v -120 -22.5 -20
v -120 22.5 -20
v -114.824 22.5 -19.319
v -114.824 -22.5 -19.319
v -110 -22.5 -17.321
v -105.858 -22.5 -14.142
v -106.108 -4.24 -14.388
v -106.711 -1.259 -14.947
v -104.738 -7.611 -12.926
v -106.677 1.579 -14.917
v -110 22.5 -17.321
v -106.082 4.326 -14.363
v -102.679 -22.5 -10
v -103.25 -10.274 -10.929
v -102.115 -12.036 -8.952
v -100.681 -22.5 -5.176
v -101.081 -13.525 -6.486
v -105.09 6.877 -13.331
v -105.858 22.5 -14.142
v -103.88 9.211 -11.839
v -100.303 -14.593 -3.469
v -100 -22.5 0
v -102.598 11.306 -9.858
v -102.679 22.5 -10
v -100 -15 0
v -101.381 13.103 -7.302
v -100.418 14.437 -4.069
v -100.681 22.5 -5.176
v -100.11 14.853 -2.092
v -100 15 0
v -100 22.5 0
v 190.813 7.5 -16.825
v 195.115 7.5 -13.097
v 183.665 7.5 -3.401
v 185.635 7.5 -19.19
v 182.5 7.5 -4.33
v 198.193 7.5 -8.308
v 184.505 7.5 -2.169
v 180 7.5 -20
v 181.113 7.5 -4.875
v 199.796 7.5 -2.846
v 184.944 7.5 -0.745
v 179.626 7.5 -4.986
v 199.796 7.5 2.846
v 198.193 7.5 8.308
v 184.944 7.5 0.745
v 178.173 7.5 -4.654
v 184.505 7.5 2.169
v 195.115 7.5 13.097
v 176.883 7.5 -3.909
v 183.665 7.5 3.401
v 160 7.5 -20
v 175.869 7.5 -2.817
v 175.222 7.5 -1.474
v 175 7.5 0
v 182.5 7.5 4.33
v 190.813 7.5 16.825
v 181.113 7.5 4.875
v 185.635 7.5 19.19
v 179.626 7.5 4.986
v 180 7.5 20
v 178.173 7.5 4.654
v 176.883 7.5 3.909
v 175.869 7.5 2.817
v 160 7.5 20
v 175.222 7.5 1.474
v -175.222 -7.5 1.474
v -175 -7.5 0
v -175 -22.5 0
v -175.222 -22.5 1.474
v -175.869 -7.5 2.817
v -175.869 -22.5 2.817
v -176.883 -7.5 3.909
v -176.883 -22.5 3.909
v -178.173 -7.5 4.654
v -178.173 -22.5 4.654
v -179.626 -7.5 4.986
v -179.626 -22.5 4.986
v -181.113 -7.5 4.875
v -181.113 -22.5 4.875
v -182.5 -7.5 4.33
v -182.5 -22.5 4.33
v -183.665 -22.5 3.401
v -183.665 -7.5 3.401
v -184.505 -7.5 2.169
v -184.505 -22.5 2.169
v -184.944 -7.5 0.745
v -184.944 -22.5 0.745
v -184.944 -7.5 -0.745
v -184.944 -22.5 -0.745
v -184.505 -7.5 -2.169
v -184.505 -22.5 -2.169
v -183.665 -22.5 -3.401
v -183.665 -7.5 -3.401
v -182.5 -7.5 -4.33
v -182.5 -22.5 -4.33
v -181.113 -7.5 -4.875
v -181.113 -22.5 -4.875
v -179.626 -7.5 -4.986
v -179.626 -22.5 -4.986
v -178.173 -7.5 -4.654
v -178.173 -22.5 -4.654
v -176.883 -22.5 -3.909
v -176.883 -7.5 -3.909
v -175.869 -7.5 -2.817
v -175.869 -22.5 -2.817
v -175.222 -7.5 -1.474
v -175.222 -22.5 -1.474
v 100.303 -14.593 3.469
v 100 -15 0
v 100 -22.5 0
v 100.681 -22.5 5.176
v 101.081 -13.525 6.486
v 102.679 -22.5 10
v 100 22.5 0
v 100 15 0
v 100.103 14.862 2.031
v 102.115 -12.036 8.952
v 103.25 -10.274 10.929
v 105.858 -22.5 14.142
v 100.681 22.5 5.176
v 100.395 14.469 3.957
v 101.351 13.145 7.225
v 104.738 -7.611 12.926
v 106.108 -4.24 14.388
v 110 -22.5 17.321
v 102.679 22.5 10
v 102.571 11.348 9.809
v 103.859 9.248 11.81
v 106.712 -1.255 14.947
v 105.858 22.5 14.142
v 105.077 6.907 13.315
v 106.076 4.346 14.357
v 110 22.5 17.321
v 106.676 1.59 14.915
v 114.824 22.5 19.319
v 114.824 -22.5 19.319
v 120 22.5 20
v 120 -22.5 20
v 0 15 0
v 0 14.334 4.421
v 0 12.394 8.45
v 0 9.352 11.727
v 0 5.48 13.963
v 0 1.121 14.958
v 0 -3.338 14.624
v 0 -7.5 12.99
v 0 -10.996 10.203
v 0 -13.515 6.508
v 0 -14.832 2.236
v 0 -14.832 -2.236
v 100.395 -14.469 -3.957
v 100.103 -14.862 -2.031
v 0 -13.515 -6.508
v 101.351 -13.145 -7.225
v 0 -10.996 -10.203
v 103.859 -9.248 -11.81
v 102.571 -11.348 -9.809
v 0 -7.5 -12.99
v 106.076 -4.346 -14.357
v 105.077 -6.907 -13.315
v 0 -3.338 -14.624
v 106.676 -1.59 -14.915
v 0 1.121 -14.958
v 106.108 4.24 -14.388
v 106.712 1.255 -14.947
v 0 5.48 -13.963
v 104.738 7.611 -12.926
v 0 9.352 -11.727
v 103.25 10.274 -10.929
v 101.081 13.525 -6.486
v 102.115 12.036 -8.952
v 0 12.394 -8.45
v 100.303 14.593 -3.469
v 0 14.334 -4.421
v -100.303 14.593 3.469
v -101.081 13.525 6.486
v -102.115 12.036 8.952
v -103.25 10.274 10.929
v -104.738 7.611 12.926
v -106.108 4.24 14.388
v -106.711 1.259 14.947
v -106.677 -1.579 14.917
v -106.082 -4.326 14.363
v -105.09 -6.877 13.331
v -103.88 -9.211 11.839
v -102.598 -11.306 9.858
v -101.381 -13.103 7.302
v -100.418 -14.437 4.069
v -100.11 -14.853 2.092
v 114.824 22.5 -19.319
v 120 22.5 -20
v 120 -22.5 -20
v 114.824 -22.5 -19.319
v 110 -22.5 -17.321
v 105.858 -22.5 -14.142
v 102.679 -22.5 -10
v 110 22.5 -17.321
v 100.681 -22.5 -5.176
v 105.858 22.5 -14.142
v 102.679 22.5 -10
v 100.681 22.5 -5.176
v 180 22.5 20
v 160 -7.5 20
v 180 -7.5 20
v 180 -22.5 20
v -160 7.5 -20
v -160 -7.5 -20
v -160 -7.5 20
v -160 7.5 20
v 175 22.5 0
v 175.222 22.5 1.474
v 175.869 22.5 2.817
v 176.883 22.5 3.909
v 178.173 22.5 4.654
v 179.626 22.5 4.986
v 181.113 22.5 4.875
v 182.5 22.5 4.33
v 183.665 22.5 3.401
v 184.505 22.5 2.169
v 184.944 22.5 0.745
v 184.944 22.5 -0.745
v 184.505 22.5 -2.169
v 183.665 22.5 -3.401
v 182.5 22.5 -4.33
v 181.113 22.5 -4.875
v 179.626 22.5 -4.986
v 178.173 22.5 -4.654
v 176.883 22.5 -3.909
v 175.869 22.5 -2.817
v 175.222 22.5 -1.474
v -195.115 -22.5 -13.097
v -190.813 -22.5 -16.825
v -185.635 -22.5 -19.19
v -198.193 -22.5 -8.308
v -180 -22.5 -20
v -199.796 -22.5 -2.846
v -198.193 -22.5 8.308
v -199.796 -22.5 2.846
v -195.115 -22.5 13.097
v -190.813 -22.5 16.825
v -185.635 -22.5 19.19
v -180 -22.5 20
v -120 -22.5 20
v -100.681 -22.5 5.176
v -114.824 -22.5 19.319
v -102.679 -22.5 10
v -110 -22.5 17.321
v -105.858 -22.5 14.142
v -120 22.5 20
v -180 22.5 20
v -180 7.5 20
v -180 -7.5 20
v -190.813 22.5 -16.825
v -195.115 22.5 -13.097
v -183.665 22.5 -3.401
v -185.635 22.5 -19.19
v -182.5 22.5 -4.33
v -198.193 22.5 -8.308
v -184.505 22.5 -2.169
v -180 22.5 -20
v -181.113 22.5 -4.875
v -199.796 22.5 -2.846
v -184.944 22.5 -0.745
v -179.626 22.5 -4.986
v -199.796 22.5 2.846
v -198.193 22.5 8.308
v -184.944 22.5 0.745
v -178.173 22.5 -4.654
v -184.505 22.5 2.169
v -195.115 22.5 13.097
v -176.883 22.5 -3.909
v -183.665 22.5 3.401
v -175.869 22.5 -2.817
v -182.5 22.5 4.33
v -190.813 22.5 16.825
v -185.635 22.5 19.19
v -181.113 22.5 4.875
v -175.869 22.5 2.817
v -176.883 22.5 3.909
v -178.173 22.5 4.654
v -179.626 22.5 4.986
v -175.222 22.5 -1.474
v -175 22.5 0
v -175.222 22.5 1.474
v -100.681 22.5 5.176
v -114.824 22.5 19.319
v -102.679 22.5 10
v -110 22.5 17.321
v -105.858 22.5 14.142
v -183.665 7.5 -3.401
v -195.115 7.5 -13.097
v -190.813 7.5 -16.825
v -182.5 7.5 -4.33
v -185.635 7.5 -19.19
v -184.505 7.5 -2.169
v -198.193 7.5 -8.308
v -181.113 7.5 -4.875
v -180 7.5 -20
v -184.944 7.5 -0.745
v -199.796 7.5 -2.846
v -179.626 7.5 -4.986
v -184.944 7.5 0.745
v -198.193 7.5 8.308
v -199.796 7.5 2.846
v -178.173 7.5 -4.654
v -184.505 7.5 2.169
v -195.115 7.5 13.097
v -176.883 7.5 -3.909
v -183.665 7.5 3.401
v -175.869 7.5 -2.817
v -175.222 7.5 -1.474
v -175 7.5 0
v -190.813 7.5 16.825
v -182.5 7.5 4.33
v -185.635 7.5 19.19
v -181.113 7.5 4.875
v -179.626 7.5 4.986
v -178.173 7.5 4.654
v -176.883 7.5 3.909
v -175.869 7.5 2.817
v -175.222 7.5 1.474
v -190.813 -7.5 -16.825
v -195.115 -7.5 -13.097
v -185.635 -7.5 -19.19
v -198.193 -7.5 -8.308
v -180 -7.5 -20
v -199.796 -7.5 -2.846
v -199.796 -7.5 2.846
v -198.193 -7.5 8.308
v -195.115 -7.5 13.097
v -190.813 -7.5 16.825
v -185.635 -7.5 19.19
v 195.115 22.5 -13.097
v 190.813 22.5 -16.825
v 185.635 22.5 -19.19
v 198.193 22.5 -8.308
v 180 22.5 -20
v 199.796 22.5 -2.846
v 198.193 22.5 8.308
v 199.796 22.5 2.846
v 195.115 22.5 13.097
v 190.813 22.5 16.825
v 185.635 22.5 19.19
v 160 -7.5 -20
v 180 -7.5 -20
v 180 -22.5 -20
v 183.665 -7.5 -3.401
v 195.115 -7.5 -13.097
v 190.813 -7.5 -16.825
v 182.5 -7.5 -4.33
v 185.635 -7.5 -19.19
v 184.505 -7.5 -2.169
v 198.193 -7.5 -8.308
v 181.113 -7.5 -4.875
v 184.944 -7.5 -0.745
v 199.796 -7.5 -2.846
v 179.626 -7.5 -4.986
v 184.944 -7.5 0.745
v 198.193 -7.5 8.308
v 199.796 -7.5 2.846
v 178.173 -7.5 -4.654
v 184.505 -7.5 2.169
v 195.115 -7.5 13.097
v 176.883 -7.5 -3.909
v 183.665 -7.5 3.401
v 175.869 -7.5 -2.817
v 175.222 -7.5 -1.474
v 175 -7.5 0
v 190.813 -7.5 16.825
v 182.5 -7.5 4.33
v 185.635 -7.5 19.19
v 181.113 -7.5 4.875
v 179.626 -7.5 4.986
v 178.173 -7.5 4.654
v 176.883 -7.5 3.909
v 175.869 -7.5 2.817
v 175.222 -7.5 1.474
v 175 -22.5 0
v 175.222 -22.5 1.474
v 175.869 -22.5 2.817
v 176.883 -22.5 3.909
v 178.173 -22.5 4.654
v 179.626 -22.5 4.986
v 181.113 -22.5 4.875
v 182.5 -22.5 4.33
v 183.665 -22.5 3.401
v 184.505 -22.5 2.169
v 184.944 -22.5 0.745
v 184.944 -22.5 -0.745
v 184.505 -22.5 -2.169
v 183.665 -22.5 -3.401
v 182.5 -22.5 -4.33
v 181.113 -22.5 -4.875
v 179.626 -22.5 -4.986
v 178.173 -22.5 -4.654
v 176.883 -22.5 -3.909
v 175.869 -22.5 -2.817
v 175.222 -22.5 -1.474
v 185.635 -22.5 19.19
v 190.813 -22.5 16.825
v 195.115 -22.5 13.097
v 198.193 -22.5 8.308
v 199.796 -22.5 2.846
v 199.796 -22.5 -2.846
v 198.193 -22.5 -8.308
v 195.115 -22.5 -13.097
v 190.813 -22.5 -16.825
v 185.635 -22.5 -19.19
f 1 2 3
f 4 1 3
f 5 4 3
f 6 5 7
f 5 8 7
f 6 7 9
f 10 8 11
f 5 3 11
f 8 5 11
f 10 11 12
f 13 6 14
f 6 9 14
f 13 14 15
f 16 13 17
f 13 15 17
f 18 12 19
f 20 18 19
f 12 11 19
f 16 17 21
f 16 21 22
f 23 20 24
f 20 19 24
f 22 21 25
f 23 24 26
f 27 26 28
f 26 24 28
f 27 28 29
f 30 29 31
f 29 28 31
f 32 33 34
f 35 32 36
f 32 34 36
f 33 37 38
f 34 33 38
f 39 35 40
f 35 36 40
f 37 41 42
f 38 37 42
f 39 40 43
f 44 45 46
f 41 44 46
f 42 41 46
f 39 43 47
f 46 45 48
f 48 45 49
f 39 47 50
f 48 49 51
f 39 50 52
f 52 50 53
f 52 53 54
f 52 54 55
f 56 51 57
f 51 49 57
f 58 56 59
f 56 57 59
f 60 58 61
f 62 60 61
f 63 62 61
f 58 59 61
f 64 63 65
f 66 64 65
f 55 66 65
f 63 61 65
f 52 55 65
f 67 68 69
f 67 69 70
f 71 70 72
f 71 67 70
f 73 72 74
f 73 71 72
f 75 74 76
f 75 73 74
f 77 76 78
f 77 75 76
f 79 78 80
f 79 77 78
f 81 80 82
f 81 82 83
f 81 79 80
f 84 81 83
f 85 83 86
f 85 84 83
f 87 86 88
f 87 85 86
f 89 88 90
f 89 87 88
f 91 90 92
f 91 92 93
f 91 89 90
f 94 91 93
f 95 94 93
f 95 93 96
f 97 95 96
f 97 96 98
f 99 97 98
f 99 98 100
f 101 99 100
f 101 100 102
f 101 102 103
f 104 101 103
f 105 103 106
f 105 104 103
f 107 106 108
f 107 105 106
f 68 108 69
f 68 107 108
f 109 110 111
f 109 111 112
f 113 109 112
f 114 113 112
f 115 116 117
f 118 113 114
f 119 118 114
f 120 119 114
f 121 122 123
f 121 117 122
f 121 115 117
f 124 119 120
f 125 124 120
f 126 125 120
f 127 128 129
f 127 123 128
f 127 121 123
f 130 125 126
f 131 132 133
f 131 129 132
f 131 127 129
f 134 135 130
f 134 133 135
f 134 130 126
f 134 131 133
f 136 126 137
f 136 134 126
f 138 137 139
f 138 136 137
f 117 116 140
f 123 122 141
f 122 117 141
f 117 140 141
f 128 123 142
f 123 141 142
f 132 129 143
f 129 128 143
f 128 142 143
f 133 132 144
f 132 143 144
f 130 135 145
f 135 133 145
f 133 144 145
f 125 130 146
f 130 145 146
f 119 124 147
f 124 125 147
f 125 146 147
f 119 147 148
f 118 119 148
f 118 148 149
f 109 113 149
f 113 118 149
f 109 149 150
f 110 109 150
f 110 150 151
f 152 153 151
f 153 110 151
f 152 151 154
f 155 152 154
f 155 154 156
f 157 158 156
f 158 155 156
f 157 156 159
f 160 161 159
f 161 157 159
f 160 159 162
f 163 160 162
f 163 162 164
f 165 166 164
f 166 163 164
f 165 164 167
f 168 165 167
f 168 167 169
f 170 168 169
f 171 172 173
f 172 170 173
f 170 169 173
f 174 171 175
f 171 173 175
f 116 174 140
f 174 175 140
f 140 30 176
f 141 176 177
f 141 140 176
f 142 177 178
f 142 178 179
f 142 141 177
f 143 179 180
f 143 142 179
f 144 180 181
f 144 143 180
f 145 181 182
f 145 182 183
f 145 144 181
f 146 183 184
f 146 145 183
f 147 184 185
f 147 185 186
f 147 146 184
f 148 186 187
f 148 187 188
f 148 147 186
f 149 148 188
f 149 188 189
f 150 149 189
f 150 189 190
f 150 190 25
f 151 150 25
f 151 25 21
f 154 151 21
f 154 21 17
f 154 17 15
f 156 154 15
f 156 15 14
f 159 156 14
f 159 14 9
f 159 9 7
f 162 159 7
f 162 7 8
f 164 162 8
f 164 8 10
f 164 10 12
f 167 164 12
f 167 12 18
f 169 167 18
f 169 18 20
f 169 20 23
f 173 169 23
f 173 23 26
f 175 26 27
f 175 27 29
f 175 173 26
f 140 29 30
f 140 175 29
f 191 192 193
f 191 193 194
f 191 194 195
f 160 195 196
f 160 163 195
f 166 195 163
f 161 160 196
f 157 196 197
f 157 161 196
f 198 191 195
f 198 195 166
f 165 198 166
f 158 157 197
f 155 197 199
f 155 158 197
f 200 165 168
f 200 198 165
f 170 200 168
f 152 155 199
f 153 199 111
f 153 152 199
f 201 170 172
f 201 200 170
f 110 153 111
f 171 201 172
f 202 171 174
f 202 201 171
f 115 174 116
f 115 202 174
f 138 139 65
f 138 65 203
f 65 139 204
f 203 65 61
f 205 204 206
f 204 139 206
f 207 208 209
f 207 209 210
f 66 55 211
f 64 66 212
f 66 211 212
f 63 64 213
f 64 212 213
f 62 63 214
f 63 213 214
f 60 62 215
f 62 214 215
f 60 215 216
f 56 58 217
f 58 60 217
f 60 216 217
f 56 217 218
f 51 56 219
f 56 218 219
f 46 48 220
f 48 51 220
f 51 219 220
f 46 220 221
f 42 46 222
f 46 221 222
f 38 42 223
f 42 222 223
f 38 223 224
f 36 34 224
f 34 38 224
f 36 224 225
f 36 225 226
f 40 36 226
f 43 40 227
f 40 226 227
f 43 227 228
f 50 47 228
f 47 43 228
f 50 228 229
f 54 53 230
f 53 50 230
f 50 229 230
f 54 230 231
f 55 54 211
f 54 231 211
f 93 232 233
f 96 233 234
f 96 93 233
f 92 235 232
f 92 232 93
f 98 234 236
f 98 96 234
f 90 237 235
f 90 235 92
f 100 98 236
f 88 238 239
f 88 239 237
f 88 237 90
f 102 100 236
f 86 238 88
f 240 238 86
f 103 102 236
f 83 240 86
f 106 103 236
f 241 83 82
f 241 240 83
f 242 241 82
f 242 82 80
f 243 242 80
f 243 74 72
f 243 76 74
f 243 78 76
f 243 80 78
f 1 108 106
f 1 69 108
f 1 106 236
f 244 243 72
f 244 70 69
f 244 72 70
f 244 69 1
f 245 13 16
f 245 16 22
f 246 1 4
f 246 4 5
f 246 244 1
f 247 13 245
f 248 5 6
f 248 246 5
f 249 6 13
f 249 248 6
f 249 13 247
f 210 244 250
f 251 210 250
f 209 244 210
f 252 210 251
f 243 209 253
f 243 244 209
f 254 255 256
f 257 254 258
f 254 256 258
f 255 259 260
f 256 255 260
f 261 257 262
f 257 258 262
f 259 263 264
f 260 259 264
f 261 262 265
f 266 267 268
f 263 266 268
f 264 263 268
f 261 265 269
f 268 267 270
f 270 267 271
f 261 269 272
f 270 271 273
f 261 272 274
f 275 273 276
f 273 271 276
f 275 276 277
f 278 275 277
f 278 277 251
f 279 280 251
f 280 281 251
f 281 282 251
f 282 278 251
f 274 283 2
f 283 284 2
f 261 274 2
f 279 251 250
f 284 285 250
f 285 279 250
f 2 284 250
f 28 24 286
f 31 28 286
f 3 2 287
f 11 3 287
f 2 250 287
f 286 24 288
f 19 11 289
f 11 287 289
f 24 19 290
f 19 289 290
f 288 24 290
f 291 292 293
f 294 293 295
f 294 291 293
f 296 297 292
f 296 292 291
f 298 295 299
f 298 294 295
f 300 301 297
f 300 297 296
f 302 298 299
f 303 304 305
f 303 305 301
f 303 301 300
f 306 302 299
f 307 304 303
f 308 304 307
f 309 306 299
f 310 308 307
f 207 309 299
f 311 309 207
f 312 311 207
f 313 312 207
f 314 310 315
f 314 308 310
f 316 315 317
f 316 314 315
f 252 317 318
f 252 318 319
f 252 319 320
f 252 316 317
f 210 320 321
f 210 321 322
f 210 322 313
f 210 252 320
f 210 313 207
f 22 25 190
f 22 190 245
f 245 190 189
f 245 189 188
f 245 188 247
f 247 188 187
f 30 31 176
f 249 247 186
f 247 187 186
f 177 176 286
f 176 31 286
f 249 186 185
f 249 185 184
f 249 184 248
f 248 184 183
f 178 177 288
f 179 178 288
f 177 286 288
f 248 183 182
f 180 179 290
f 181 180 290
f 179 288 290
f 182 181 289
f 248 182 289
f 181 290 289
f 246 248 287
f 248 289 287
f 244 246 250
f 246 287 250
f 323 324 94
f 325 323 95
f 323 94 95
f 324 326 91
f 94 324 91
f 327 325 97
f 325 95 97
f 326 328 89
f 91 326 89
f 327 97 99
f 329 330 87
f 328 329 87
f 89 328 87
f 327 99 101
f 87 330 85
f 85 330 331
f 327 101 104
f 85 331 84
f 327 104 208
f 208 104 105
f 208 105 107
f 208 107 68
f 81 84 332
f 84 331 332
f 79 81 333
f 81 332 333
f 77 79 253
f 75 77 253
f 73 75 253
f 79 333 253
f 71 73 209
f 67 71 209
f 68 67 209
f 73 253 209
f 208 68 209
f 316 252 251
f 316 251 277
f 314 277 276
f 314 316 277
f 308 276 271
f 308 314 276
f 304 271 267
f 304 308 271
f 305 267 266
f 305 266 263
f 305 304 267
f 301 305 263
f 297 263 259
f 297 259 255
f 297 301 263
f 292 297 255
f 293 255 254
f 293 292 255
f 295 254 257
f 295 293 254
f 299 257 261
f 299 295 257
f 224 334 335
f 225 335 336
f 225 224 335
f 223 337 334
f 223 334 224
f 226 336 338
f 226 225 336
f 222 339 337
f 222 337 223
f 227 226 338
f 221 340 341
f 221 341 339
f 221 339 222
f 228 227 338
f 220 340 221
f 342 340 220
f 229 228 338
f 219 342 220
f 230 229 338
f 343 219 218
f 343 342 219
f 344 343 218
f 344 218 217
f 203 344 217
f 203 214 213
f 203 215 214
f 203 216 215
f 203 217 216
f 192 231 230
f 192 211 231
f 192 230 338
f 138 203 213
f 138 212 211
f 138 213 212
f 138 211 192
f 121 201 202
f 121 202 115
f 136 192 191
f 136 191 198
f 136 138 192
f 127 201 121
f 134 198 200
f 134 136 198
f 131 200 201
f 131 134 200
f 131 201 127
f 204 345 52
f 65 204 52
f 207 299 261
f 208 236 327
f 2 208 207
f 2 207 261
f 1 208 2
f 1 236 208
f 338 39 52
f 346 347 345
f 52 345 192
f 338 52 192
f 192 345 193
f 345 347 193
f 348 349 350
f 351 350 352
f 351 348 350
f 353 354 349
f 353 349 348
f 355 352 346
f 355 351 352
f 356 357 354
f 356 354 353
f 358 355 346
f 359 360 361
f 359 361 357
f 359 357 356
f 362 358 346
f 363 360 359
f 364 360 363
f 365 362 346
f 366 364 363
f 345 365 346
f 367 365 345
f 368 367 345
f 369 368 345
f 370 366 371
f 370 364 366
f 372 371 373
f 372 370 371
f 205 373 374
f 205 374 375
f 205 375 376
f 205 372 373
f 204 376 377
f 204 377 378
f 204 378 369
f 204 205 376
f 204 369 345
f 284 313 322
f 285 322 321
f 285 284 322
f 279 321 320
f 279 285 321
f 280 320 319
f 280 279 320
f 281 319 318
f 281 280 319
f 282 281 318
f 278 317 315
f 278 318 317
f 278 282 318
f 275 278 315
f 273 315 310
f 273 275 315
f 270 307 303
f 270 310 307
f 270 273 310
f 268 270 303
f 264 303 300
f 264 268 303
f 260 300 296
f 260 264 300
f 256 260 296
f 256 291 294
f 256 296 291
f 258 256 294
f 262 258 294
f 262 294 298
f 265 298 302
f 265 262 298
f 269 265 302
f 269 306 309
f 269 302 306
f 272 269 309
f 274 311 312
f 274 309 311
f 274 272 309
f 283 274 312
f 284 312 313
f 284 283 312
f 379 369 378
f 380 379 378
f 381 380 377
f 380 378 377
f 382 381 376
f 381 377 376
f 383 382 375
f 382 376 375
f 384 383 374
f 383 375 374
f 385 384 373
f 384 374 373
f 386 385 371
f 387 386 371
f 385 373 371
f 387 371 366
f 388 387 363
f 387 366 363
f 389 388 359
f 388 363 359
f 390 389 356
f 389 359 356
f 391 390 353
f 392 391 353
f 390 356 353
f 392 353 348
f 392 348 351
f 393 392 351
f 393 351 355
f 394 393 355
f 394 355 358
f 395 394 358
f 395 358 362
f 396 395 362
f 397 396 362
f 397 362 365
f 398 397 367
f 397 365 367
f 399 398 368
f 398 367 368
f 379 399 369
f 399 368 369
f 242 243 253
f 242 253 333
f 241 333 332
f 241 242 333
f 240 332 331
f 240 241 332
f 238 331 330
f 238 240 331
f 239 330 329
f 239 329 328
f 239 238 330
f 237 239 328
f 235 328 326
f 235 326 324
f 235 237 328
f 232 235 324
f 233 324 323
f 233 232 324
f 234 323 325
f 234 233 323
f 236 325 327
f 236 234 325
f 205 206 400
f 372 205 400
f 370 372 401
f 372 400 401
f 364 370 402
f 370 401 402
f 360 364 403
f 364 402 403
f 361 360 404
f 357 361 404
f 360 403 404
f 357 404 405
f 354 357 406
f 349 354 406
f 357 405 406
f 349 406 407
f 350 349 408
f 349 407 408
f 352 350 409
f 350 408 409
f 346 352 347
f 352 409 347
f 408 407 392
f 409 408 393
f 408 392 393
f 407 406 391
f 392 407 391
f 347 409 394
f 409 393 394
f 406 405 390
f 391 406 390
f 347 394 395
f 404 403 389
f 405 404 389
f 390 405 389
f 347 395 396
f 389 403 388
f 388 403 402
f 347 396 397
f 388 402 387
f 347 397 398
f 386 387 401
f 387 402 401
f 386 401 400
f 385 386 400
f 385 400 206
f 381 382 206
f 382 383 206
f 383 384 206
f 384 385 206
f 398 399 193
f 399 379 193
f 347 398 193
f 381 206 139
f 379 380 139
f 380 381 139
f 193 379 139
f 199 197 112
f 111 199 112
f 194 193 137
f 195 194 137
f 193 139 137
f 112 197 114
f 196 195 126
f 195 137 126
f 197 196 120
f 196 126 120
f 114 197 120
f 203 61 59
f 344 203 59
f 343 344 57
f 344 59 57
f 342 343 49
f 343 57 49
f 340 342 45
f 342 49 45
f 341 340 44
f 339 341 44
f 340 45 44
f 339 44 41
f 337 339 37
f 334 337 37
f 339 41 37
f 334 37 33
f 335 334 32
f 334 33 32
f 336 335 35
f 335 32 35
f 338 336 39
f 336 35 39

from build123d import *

# Parameters (mm, degrees)
F0_R          = 5
F1_DEPTH      = 22.5
F2_W          = 80
F2_H          = 15
F3_DEPTH      = 36.7
F5_R          = 15
F6_DEPTH      = 106.7712435447
F6_DEPTH_BACK = 106.7712435447


with BuildPart() as f1:
    # F0 (on Front) → F1 (new body, symmetric)
    with BuildSketch(Plane.XZ):
        with BuildLine():
            ThreePointArc((-180, -20), (-165.8578643763, -14.1421356237), (-160, 0))
            ThreePointArc((-160, 0), (-165.8578643763, 14.1421356237), (-180, 20))
            ThreePointArc((-180, 20), (-200, 0), (-180, -20))
        make_face()
        with Locations((-180, 0)):
            Circle(F0_R, mode=Mode.SUBTRACT)
        with BuildLine():
            ThreePointArc((-180, 20), (-165.8578643763, 14.1421356237), (-160, 0))
            ThreePointArc((-160, 0), (-165.8578643763, -14.1421356237), (-180, -20))
            Line((-180, -20), (-120, -20))
            ThreePointArc((-120, -20), (-140, 0), (-120, 20))
            Line((-120, 20), (-180, 20))
        make_face()
        with BuildLine():
            ThreePointArc((-100, 0), (-105.8578643763, 14.1421356237), (-120, 20))
            ThreePointArc((-120, 20), (-140, 0), (-120, -20))
            ThreePointArc((-120, -20), (-105.8578643763, -14.1421356237), (-100, 0))
        make_face()
    extrude(amount=F1_DEPTH, both=True)

    # F2 (on Top) → F3 (cut, symmetric)
    with BuildSketch(Plane.XY):
        with Locations((-200, 0)):
            Rectangle(F2_W, F2_H)
    extrude(amount=F3_DEPTH, both=True, mode=Mode.SUBTRACT)


with BuildPart() as f4_1:
    # F4: instance of F1
    add(f1.part.mirror(Plane.YZ))


with BuildPart() as f1_1:
    add(f1.part)

    add(f4_1.part)  # F6 merges F4_1
    # F5 (on Right) → F6 (join, two sides)
    with BuildSketch(Plane.YZ) as f6_sk:
        Circle(F5_R)
    extrude(amount=F6_DEPTH)
    extrude(f6_sk.sketch, amount=-F6_DEPTH_BACK)


solid = f1_1.part
